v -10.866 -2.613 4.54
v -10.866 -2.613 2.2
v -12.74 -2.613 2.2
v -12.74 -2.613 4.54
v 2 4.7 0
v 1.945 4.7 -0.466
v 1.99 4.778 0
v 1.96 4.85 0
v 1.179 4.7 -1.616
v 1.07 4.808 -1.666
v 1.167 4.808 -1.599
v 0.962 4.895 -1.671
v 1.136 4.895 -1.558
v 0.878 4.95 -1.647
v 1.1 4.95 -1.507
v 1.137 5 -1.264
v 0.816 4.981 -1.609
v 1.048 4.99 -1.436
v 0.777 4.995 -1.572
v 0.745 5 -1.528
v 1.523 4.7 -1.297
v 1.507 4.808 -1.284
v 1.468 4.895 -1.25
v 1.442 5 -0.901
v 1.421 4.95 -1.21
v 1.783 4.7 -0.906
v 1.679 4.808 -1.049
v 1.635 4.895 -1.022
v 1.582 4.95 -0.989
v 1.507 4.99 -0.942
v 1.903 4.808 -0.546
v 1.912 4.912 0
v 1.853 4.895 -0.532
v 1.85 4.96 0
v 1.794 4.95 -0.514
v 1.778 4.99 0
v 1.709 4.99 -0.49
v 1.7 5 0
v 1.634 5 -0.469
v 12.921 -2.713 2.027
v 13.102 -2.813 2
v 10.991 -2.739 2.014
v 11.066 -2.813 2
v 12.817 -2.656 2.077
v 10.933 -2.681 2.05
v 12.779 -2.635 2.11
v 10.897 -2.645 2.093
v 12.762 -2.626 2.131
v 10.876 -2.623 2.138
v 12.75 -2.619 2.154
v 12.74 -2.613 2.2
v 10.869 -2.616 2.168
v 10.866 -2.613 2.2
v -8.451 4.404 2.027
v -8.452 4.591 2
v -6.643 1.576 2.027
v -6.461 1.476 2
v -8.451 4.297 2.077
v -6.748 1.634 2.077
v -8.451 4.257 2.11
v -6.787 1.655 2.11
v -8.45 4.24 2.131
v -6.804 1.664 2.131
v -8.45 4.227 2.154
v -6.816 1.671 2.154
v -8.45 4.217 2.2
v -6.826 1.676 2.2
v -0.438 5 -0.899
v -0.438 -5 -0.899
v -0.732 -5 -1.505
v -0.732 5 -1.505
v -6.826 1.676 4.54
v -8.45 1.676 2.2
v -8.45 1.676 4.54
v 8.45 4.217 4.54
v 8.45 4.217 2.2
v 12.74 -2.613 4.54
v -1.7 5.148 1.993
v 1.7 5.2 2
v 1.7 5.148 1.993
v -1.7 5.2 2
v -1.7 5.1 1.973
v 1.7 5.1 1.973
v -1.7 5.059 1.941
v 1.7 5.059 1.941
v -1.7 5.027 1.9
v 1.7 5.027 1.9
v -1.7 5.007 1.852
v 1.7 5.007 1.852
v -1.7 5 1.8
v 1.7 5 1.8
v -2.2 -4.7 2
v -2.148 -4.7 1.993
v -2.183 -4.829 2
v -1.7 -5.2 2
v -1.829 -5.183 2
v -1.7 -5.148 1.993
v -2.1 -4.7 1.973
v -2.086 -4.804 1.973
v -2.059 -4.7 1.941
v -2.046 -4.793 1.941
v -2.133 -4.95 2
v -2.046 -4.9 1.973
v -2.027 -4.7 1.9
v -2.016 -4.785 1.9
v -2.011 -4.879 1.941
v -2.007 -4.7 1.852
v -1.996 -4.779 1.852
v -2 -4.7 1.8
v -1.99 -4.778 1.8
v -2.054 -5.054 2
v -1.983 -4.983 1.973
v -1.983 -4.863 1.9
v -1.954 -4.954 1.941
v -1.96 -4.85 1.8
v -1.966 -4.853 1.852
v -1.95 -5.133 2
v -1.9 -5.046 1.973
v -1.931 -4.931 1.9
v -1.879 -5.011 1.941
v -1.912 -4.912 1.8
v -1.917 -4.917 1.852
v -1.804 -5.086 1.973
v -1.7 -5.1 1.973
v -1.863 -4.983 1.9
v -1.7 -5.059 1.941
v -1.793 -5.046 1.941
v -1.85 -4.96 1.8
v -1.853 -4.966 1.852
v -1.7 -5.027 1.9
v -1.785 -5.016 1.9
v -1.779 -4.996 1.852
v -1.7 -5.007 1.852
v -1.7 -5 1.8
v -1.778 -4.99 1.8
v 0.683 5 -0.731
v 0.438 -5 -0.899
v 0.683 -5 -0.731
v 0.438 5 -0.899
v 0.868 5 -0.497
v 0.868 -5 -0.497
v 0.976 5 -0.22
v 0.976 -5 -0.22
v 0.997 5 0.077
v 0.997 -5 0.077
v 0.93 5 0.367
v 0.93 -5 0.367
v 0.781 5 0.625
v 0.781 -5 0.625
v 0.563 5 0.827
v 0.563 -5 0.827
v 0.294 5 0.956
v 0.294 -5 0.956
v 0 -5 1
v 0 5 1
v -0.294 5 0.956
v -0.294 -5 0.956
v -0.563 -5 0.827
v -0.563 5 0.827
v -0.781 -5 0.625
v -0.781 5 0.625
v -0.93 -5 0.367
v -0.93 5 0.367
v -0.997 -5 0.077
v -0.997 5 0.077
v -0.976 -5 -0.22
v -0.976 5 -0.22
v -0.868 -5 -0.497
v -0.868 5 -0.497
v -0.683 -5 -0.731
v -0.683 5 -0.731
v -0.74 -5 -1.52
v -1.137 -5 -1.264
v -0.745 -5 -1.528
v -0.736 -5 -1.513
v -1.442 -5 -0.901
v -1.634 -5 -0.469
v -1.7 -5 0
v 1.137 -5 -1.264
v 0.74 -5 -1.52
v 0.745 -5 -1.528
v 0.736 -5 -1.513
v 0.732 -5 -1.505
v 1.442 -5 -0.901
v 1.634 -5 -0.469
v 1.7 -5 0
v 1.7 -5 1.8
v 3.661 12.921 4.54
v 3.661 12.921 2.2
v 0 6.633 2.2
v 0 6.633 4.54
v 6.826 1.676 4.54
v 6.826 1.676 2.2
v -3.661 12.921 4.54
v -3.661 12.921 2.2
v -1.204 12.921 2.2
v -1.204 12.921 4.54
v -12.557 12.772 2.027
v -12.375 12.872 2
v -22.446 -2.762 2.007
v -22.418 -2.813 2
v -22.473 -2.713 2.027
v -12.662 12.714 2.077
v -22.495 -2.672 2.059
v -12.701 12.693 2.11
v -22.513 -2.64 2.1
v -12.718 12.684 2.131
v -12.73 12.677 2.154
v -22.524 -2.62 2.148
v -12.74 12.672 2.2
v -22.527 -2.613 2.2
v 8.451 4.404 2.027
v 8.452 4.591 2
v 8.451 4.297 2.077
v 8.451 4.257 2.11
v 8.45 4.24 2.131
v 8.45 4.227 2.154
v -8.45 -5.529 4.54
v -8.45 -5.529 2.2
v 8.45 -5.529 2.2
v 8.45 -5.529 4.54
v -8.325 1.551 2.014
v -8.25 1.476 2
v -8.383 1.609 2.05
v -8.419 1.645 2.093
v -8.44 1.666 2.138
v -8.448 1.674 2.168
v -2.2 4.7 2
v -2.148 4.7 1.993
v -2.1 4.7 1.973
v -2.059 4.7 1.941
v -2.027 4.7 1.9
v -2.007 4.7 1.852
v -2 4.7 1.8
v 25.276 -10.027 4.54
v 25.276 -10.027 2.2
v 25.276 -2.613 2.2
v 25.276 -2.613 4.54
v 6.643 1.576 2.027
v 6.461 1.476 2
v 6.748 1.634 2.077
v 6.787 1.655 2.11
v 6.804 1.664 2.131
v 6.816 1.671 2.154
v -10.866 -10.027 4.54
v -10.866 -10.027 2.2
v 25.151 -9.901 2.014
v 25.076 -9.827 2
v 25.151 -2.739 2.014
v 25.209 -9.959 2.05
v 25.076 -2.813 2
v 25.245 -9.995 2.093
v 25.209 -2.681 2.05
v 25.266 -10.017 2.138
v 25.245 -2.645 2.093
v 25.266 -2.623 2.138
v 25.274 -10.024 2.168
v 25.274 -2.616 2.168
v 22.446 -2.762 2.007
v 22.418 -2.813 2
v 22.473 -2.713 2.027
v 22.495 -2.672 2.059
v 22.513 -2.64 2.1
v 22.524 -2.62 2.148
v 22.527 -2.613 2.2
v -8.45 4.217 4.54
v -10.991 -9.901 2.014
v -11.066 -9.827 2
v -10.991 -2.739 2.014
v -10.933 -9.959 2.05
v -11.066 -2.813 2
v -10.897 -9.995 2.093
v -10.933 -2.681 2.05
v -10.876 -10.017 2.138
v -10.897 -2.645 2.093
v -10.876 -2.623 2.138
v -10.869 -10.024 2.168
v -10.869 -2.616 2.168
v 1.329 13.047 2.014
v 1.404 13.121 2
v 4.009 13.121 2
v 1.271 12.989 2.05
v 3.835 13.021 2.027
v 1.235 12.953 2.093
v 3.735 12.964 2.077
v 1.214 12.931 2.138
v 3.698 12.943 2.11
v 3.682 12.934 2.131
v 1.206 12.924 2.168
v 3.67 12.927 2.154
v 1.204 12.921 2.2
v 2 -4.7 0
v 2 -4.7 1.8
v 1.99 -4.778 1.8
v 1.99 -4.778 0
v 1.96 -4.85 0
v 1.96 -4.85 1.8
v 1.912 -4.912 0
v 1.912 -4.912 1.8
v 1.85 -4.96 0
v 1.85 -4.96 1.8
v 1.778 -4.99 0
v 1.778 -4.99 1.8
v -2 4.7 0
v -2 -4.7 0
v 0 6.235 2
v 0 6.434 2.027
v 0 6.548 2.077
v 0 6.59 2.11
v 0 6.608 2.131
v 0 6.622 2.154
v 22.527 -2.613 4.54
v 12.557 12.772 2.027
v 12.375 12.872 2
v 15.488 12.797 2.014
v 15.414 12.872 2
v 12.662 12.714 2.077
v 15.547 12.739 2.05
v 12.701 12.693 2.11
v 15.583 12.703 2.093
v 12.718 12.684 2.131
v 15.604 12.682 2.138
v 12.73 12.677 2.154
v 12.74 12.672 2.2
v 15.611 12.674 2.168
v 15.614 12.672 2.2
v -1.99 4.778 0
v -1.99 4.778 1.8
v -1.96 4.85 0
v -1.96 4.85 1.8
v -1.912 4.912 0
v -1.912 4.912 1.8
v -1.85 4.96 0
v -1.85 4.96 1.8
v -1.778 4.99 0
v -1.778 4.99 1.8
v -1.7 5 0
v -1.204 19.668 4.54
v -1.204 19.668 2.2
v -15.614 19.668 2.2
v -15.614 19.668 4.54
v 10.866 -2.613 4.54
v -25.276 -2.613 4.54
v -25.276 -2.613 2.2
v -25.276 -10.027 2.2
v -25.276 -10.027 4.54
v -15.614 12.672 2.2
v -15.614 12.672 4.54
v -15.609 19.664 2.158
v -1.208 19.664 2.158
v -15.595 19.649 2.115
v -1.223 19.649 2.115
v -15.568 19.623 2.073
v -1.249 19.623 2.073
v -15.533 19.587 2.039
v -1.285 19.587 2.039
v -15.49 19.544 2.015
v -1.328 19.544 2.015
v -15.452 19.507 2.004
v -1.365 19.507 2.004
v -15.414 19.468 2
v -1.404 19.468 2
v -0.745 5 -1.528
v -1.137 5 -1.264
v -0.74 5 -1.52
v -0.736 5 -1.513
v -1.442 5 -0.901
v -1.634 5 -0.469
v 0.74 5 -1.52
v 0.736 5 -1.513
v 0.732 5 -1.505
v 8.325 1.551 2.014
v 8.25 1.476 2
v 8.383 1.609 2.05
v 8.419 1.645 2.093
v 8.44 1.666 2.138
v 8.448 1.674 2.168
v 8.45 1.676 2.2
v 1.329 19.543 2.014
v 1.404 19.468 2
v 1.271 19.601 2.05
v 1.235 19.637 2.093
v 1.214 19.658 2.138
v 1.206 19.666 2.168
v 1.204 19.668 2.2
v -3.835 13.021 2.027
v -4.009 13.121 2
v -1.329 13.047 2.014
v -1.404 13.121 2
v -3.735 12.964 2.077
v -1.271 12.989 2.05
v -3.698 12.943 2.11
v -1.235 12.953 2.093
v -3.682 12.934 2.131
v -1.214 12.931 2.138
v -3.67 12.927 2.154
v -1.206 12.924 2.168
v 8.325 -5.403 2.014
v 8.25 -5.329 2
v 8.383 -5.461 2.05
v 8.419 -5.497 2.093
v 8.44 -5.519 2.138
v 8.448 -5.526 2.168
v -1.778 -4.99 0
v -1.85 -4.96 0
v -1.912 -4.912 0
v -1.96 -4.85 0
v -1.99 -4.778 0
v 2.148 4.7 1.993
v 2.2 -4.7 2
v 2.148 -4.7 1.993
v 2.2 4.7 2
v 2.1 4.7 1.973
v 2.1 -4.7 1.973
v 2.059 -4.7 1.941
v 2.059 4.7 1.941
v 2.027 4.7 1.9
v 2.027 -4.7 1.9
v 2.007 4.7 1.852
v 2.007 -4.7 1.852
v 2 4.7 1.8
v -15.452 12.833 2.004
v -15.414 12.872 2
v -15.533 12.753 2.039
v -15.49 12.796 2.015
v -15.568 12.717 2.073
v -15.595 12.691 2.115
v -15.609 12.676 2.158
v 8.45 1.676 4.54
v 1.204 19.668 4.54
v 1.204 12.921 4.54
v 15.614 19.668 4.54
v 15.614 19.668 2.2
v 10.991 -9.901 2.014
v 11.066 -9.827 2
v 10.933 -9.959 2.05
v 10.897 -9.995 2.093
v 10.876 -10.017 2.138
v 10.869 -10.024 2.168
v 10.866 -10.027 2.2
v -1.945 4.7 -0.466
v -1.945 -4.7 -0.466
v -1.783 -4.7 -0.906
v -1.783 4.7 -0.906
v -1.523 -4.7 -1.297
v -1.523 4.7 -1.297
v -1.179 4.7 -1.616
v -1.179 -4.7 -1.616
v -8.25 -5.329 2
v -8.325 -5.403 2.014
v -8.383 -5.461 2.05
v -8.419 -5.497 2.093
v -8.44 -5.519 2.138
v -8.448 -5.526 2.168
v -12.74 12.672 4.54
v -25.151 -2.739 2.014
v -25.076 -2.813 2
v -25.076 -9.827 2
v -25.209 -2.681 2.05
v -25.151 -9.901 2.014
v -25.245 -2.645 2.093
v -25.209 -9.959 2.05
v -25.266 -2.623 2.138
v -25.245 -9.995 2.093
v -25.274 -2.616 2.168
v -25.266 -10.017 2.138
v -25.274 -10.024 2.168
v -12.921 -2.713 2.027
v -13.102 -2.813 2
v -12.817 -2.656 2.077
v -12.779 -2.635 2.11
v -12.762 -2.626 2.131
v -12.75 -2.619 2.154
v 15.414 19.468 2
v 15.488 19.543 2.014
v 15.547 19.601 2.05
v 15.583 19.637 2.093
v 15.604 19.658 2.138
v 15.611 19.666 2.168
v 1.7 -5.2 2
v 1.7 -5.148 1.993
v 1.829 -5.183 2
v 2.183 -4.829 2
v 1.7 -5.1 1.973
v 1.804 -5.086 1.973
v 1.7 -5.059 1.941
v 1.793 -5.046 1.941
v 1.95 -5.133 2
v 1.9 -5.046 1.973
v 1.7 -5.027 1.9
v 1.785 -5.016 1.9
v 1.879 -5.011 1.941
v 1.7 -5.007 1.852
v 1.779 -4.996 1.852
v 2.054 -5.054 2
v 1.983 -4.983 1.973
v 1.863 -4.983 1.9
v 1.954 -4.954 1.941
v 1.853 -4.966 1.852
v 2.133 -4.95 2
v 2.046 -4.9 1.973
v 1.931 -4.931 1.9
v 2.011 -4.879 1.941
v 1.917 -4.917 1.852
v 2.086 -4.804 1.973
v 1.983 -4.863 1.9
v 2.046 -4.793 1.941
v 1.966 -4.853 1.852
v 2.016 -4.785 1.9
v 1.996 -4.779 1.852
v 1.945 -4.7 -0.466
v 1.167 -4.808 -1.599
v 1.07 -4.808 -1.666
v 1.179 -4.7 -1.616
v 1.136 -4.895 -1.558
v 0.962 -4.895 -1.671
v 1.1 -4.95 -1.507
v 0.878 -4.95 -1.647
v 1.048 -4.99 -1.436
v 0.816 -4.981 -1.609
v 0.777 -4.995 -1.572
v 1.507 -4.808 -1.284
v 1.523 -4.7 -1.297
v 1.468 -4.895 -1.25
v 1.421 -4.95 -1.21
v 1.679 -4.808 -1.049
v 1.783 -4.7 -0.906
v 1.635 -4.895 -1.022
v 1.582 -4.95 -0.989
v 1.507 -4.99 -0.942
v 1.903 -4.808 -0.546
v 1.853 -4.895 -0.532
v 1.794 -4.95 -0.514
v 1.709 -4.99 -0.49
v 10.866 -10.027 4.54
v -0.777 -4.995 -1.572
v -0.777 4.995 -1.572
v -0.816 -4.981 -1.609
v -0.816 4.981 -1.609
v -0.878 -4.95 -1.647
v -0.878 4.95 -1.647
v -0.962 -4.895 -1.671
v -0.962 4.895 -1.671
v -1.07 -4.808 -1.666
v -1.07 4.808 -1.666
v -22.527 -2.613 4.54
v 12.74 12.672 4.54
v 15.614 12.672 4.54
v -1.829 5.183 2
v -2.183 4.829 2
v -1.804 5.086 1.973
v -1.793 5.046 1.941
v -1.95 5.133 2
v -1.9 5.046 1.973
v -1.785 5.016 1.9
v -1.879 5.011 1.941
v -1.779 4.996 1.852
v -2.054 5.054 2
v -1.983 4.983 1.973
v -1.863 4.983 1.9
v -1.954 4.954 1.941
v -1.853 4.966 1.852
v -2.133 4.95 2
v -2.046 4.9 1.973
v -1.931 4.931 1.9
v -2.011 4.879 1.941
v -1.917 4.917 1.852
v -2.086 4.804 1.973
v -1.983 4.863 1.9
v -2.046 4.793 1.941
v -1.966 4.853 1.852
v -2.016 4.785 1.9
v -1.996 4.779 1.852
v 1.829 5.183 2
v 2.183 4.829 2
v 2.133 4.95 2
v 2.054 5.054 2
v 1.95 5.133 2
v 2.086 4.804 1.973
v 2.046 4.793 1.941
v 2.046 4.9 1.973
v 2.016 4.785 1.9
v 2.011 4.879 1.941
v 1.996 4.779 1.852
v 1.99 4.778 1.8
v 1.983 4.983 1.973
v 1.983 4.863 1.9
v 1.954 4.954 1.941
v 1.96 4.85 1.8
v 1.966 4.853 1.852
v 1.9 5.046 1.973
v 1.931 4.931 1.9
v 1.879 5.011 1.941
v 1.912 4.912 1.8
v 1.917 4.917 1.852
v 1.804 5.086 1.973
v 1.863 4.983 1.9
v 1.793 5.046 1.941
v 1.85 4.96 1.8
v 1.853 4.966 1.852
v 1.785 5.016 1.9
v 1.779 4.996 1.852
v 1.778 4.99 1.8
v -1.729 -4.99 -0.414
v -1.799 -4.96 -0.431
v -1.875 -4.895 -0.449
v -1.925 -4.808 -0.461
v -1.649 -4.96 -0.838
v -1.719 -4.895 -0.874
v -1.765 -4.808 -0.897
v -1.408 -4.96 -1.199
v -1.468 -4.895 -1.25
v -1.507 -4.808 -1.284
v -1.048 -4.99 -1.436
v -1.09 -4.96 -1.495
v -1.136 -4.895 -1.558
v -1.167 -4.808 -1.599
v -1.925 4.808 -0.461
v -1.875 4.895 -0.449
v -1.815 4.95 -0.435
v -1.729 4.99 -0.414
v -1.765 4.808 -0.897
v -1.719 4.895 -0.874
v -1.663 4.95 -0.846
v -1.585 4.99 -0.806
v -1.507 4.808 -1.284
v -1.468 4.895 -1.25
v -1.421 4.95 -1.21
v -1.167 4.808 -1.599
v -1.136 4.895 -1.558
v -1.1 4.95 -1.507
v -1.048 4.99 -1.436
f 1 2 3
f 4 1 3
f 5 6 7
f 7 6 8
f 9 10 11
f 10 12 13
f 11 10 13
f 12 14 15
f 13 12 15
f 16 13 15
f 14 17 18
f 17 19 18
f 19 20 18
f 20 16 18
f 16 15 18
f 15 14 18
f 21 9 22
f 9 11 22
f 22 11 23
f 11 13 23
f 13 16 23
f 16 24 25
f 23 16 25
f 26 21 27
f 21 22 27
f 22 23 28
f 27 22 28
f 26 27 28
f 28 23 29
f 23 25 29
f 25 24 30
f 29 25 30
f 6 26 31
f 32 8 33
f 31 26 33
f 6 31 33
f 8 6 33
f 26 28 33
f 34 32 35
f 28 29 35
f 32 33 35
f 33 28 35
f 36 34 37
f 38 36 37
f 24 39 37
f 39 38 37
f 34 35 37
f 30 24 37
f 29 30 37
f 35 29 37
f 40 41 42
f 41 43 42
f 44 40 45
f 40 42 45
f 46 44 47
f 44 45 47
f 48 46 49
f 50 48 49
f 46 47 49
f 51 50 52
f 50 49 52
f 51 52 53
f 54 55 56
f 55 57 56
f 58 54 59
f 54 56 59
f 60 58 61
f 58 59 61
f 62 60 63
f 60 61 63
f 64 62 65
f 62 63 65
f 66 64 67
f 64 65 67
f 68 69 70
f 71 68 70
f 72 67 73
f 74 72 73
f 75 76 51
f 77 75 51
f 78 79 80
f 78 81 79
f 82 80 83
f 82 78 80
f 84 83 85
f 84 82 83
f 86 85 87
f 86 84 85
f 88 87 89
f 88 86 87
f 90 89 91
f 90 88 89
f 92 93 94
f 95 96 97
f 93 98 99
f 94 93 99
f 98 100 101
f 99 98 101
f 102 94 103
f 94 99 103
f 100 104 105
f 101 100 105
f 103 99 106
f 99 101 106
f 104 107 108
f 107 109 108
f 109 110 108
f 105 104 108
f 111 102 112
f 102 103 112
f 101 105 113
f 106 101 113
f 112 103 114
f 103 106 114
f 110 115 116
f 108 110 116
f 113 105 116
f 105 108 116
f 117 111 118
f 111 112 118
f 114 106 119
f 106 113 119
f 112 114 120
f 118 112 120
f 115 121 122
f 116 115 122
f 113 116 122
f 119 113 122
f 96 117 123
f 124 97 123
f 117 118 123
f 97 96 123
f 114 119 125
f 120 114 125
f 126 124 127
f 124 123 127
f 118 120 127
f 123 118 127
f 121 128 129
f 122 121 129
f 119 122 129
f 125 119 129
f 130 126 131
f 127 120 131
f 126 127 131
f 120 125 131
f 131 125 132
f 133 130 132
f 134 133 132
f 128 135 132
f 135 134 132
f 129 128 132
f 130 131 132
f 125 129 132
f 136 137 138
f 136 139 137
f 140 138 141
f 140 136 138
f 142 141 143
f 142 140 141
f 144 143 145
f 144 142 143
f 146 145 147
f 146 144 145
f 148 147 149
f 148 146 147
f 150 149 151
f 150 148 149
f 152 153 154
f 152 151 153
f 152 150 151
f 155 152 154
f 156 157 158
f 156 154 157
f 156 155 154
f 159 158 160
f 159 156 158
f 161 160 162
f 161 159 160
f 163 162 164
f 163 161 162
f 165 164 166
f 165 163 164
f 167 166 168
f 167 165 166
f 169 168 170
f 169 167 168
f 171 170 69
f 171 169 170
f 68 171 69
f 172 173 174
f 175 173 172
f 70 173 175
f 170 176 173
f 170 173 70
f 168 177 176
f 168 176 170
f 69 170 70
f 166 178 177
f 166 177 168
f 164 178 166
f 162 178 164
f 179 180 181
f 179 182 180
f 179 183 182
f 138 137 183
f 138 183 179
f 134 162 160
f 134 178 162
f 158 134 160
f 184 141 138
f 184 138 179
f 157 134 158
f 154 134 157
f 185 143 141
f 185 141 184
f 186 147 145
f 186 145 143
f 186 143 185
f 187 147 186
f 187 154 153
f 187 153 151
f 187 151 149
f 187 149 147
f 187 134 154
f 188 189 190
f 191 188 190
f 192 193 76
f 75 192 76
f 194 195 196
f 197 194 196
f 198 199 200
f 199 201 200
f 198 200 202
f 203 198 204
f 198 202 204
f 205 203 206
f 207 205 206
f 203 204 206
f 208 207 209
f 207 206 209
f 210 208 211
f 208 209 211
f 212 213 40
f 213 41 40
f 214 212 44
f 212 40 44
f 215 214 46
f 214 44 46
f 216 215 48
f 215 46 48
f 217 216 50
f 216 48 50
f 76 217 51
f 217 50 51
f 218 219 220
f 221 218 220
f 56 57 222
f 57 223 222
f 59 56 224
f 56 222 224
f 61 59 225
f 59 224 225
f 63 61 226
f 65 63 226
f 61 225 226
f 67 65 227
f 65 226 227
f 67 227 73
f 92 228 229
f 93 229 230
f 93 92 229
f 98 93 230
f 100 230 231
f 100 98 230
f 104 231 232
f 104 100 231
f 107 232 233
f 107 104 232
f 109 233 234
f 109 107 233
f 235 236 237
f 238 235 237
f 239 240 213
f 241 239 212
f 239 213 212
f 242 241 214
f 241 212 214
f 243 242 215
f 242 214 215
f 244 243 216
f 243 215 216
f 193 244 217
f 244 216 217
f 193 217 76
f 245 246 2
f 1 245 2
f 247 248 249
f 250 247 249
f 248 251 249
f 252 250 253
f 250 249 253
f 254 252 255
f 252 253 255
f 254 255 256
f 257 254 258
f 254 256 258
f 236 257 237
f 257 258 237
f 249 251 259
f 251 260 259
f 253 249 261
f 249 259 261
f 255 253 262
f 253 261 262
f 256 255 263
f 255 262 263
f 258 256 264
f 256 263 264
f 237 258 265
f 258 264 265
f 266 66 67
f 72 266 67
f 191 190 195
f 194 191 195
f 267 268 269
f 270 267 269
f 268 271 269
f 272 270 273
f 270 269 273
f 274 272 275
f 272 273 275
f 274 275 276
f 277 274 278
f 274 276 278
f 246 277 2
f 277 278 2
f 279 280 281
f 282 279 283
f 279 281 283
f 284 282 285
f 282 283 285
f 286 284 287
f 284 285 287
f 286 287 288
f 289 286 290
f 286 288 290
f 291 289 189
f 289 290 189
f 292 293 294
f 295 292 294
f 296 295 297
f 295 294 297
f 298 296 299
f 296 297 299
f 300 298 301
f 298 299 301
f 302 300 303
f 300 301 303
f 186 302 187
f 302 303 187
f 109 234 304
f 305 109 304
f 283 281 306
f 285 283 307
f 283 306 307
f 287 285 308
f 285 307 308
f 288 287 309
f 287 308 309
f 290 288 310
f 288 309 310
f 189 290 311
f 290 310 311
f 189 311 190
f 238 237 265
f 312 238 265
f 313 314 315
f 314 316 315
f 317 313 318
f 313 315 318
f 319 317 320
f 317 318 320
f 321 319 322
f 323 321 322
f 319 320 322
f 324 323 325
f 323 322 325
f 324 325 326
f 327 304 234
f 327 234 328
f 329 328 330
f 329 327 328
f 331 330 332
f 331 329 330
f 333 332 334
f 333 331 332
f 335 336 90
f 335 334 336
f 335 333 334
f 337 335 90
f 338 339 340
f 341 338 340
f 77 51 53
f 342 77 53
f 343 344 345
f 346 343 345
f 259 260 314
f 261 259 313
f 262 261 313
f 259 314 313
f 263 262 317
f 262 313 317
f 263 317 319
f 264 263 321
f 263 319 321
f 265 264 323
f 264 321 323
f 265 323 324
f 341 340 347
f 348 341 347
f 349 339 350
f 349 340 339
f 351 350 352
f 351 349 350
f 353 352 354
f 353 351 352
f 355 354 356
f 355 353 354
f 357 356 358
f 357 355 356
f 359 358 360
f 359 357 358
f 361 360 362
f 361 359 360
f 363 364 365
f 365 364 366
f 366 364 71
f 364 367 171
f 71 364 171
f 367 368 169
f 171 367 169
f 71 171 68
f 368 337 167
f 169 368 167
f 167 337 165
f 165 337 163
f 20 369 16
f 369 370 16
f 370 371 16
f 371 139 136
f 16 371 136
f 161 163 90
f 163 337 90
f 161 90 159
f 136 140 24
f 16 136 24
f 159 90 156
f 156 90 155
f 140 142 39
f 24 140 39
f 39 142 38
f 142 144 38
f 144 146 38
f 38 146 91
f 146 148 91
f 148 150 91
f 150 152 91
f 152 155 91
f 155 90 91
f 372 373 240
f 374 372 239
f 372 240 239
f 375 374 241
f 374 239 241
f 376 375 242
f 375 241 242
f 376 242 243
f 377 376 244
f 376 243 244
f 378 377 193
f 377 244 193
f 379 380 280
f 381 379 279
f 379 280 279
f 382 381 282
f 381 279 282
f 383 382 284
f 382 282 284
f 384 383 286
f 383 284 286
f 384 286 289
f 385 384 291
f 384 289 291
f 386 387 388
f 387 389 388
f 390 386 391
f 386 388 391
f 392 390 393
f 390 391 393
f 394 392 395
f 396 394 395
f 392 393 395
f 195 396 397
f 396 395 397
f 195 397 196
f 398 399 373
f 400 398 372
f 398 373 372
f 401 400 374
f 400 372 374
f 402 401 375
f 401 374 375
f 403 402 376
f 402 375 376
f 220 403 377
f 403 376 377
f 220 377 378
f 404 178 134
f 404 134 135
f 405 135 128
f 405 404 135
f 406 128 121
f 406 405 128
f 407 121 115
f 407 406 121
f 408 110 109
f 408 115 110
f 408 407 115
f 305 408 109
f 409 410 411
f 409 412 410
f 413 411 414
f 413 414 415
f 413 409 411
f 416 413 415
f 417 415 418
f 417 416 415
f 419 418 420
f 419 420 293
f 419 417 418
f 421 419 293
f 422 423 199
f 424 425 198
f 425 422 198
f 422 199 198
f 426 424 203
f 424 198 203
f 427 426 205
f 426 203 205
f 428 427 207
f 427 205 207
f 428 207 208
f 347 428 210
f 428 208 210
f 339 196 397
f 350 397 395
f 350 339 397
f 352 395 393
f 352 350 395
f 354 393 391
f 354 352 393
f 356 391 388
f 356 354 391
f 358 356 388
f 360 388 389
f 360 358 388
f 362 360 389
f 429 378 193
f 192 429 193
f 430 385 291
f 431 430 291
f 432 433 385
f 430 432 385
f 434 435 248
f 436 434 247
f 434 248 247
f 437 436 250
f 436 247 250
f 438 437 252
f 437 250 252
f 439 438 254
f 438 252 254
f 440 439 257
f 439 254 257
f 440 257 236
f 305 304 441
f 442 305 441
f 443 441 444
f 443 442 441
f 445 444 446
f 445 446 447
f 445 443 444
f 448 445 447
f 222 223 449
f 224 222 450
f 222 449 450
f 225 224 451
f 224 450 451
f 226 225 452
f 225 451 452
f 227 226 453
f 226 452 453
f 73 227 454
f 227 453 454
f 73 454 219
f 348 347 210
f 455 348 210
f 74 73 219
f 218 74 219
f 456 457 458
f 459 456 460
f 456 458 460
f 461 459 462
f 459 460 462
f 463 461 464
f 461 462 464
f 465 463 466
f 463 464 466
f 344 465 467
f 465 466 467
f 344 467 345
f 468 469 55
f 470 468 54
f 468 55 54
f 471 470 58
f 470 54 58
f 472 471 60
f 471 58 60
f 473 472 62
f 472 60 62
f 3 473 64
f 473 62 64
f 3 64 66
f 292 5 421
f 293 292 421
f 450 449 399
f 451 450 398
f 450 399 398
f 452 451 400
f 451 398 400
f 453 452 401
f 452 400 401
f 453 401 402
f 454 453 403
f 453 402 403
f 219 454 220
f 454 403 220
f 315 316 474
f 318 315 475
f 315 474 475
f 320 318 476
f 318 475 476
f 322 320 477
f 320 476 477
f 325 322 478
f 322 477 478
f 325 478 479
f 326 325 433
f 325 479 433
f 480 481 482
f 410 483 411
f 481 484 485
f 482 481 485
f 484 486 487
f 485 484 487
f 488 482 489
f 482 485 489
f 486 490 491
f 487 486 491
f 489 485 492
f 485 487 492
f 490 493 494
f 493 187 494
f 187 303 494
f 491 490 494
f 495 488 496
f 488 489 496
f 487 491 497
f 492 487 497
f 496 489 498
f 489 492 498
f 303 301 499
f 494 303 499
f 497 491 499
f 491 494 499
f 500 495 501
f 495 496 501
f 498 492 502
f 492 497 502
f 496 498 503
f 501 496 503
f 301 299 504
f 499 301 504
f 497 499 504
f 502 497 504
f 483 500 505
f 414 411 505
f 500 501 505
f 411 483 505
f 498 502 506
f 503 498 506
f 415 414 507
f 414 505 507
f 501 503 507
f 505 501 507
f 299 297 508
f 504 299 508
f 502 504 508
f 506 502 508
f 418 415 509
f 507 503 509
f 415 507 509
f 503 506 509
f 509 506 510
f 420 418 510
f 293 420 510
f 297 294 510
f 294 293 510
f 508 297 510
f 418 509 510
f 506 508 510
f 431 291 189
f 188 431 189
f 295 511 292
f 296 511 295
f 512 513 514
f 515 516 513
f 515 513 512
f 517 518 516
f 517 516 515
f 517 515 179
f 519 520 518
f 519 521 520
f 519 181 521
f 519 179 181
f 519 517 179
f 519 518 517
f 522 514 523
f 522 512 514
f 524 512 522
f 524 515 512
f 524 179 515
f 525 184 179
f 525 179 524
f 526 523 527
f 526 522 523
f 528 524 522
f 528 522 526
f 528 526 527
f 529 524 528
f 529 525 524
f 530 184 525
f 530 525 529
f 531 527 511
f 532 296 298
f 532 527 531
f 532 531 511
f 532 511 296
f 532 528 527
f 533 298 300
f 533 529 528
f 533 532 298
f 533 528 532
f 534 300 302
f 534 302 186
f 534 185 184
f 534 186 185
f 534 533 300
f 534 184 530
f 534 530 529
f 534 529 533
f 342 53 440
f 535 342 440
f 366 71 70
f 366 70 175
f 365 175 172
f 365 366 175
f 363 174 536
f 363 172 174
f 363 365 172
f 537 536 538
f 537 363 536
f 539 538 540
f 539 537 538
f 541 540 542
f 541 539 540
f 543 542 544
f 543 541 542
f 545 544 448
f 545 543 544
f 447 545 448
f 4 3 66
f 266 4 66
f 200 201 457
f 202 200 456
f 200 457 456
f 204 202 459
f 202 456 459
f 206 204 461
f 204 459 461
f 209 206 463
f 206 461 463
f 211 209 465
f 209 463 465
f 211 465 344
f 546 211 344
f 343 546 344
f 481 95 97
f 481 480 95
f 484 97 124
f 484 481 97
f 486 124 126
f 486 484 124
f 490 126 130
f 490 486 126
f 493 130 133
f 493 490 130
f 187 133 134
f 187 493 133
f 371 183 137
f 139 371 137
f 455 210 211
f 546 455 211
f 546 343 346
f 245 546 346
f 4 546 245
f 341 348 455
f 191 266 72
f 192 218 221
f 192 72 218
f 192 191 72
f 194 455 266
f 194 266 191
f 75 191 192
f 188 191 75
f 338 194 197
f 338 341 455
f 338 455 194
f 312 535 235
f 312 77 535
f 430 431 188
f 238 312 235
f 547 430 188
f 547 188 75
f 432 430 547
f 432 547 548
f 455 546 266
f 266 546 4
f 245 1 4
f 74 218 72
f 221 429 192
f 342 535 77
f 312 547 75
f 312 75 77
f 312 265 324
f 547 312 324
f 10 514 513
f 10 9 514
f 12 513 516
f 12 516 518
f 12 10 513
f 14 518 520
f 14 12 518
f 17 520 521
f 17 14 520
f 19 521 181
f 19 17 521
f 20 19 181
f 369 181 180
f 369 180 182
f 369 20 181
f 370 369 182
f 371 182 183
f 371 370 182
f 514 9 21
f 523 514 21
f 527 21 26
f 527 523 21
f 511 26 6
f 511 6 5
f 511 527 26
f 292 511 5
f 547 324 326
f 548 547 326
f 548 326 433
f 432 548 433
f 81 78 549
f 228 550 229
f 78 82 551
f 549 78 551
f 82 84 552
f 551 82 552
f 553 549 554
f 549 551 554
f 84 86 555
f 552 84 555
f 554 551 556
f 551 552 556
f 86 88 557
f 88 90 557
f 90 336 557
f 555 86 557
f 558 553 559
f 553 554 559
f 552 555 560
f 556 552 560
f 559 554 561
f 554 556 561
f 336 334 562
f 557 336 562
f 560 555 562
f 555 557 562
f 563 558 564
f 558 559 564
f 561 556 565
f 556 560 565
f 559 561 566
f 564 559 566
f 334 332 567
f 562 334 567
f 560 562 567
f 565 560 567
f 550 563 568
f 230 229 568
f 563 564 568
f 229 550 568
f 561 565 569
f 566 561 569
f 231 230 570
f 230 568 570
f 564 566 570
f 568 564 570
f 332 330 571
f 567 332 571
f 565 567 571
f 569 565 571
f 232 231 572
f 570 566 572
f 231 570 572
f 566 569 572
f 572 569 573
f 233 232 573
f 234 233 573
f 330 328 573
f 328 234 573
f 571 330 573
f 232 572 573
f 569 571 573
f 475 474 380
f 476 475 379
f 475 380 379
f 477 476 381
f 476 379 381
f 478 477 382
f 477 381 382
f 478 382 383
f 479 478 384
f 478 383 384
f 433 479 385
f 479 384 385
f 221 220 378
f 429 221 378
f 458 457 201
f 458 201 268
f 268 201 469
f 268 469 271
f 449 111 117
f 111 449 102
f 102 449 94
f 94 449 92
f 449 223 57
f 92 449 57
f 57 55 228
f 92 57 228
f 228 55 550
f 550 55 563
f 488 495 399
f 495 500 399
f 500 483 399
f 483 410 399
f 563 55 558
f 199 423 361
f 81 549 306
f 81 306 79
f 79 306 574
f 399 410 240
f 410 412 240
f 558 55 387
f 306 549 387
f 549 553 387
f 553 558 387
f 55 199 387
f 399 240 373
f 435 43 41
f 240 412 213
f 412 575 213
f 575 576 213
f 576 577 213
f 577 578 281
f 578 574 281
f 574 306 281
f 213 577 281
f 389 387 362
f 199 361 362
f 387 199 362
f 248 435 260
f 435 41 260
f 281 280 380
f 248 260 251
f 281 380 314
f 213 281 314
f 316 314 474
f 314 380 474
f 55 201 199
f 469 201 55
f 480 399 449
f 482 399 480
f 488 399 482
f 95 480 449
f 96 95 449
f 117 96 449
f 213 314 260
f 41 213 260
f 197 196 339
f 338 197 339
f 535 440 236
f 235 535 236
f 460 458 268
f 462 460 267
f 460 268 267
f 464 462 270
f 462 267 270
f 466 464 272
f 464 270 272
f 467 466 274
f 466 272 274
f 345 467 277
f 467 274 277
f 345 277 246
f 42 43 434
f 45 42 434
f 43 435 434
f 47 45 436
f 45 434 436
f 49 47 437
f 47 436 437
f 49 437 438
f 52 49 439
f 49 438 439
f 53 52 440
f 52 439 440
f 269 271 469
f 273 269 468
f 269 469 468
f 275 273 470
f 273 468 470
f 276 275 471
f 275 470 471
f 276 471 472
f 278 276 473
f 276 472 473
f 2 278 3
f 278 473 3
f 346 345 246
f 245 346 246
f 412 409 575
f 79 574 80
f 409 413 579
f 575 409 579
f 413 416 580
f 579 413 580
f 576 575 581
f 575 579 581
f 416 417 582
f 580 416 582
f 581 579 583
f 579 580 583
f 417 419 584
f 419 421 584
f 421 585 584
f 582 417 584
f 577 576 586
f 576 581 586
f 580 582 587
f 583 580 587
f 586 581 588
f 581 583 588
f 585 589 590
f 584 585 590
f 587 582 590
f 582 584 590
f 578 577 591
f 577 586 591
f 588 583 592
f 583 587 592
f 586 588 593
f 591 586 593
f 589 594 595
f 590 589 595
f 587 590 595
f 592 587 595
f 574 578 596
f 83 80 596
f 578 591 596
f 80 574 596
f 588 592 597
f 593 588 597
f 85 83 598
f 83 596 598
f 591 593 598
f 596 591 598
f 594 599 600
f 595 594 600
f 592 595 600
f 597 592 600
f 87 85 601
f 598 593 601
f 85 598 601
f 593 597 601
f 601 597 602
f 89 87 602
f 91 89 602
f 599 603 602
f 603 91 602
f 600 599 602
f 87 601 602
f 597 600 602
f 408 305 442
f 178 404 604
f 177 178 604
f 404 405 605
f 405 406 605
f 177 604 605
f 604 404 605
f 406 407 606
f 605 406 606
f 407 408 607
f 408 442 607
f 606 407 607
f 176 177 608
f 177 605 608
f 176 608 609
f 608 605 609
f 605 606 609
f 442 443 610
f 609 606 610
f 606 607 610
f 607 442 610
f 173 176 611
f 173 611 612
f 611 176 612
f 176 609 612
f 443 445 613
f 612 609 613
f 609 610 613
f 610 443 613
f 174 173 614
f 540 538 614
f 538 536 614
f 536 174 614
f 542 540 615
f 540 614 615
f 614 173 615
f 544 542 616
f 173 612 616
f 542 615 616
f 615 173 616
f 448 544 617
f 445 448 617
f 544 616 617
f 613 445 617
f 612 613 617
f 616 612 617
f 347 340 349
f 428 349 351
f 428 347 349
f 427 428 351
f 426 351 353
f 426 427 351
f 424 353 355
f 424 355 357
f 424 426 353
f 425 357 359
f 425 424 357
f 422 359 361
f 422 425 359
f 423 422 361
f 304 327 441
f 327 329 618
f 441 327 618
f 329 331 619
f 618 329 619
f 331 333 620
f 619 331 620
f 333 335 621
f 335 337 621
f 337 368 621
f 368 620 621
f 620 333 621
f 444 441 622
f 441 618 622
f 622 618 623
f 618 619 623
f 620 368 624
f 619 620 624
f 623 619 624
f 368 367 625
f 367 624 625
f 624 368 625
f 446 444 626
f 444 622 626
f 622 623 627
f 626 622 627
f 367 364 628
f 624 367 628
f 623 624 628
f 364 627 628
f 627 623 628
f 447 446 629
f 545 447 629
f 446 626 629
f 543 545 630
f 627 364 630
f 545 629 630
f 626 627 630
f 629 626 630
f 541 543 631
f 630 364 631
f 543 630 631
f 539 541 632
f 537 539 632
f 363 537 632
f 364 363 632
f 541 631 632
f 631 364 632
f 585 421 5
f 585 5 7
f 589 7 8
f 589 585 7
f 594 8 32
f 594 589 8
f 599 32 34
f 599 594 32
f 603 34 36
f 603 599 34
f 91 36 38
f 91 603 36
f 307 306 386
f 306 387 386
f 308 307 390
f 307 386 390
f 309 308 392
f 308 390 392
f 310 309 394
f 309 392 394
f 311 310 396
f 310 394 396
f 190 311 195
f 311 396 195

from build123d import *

# Parameters (mm, degrees)
F0_R     = 1
F1_DEPTH = 5
F3_DEPTH = 10.001
F4_R     = 0.3
F6_DEPTH = 2.54
F7_R     = 0.2


with BuildPart() as f1:
    # F0 (on Front) → F1 (new body, symmetric)
    with BuildSketch(Plane.XZ):
        with BuildLine():
            Line((-2, 2), (-2, 0))
            ThreePointArc((-2, 0), (0, -2), (2, 0))
            Line((2, 0), (2, 2))
            Line((2, 2), (0, 2))
            Line((0, 2), (-2, 2))
        make_face()
        Circle(F0_R, mode=Mode.SUBTRACT)
    extrude(amount=F1_DEPTH, both=True)

    # F2 (on face) → F3 (cut, through all)
    with BuildSketch(Plane.XZ.offset(5)):
        with BuildLine():
            Line((0.875, -1.7984368212), (0, 0))
            Line((0, 0), (-0.875, -1.7984368212))
            ThreePointArc((-0.875, -1.7984368212), (0, -2), (0.875, -1.7984368212))
        make_face()
    extrude(amount=-F3_DEPTH, mode=Mode.SUBTRACT)

    # F4
    f4_edges = [f1.edges().sort_by_distance(p)[0] for p in [
        (-0.875, 0, -1.798437),
        (0.875, 0, -1.798437),
        (-1.695582, -5, -1.06066),
        (-2, -5, 1),
        (1.695582, -5, -1.06066),
        (1.695582, 5, -1.06066),
        (2, 5, 1),
        (-1.695582, 5, -1.06066),
        (-2, 5, 1),
        (2, -5, 1),
    ]]
    fillet(f4_edges, radius=F4_R)

    # F5 (on face) → F6 (join)
    with BuildSketch(Plane.XY.offset(2)):
        Polygon((-1.2036230182, 19.6684543043), (-15.6138911843, 19.6684543043), (-15.6138911843, 12.6715609804), (-12.7401659265, 12.6715609804), (-22.5274879485, -2.6133179199), (-25.2762660384, -2.6133179199), (-25.2762660384, -10.0266933441), (-10.8659984544, -10.0266933441), (-10.8659984544, -2.6133179199), (-12.7401659265, -2.6133179199), (-8.4504038095, 4.2169820517), (-6.826125551, 1.676443615), (-8.4504038095, 1.676443615), (-8.4504038095, -5.5286907591), (0, -5.5286907591), (8.4504038095, -5.5286907591), (8.4504038095, 1.676443615), (6.826125551, 1.676443615), (8.4504038095, 4.2169820517), (12.7401659265, -2.6133179199), (10.8659984544, -2.6133179199), (10.8659984544, -10.0266933441), (25.2762660384, -10.0266933441), (25.2762660384, -2.6133179199), (22.5274879485, -2.6133179199), (12.7401659265, 12.6715609804), (15.6138911843, 12.6715609804), (15.6138911843, 19.6684543043), (1.2036230182, 19.6684543043), (1.2036230182, 12.9214497283), (3.6608641967, 12.9214497283), (0, 6.6325762309), (-3.6608641967, 12.9214497283), (-1.2036230182, 12.9214497283), align=None)
        with BuildLine():
            Line((2, 4.7), (2, -4.7))
            ThreePointArc((2, -4.7), (1.9121320344, -4.9121320344), (1.7, -5))
            Line((1.7, -5), (-1.7, -5))
            ThreePointArc((-1.7, -5), (-1.9121320344, -4.9121320344), (-2, -4.7))
            Line((-2, -4.7), (-2, 4.7))
            ThreePointArc((-2, 4.7), (-1.9121320344, 4.9121320344), (-1.7, 5))
            Line((-1.7, 5), (1.7, 5))
            ThreePointArc((1.7, 5), (1.9121320344, 4.9121320344), (2, 4.7))
        make_face(mode=Mode.SUBTRACT)
        with BuildLine():
            ThreePointArc((1.7, -5), (1.9121320344, -4.9121320344), (2, -4.7))
            Line((2, -4.7), (2, 4.7))
            ThreePointArc((2, 4.7), (1.9121320344, 4.9121320344), (1.7, 5))
            Line((1.7, 5), (-1.7, 5))
            ThreePointArc((-1.7, 5), (-1.9121320344, 4.9121320344), (-2, 4.7))
            Line((-2, 4.7), (-2, -4.7))
            ThreePointArc((-2, -4.7), (-1.9121320344, -4.9121320344), (-1.7, -5))
            Line((-1.7, -5), (1.7, -5))
        make_face()
    extrude(amount=F6_DEPTH)

    # F7
    f7_edges = [f1.edges().sort_by_distance(p)[0] for p in [
        (14.177029, 12.671561, 2),
        (17.633827, 5.029122, 2),
        (15.613891, 16.170008, 2),
        (23.901877, -2.613318, 2),
        (8.408757, 19.668454, 2),
        (25.276266, -6.320006, 2),
        (1.203623, 16.294952, 2),
        (18.071132, -10.026693, 2),
        (2.432244, 12.92145, 2),
        (10.865998, -6.320006, 2),
        (1.830432, 9.777013, 2),
        (11.803082, -2.613318, 2),
        (-1.830432, 9.777013, 2),
        (10.595285, 0.801832, 2),
        (-2.432244, 12.92145, 2),
        (7.638265, 2.946713, 2),
        (-1.203623, 16.294952, 2),
        (7.638265, 1.676444, 2),
        (-8.408757, 19.668454, 2),
        (8.450404, -1.926124, 2),
        (-15.613891, 16.170008, 2),
        (0, -5.528691, 2),
        (-14.177029, 12.671561, 2),
        (-8.450404, -1.926124, 2),
        (-17.633827, 5.029122, 2),
        (-7.638265, 1.676444, 2),
        (-23.901877, -2.613318, 2),
        (-7.638265, 2.946713, 2),
        (-25.276266, -6.320006, 2),
        (-10.595285, 0.801832, 2),
        (-18.071132, -10.026693, 2),
        (-11.803082, -2.613318, 2),
        (-10.865998, -6.320006, 2),
        (1.912132, 4.912132, 2),
        (0, 5, 2),
        (-1.912132, 4.912132, 2),
        (-2, 0, 2),
        (-1.912132, -4.912132, 2),
        (0, -5, 2),
        (1.912132, -4.912132, 2),
        (2, 0, 2),
    ]]
    fillet(f7_edges, radius=F7_R)


solid = f1.part
